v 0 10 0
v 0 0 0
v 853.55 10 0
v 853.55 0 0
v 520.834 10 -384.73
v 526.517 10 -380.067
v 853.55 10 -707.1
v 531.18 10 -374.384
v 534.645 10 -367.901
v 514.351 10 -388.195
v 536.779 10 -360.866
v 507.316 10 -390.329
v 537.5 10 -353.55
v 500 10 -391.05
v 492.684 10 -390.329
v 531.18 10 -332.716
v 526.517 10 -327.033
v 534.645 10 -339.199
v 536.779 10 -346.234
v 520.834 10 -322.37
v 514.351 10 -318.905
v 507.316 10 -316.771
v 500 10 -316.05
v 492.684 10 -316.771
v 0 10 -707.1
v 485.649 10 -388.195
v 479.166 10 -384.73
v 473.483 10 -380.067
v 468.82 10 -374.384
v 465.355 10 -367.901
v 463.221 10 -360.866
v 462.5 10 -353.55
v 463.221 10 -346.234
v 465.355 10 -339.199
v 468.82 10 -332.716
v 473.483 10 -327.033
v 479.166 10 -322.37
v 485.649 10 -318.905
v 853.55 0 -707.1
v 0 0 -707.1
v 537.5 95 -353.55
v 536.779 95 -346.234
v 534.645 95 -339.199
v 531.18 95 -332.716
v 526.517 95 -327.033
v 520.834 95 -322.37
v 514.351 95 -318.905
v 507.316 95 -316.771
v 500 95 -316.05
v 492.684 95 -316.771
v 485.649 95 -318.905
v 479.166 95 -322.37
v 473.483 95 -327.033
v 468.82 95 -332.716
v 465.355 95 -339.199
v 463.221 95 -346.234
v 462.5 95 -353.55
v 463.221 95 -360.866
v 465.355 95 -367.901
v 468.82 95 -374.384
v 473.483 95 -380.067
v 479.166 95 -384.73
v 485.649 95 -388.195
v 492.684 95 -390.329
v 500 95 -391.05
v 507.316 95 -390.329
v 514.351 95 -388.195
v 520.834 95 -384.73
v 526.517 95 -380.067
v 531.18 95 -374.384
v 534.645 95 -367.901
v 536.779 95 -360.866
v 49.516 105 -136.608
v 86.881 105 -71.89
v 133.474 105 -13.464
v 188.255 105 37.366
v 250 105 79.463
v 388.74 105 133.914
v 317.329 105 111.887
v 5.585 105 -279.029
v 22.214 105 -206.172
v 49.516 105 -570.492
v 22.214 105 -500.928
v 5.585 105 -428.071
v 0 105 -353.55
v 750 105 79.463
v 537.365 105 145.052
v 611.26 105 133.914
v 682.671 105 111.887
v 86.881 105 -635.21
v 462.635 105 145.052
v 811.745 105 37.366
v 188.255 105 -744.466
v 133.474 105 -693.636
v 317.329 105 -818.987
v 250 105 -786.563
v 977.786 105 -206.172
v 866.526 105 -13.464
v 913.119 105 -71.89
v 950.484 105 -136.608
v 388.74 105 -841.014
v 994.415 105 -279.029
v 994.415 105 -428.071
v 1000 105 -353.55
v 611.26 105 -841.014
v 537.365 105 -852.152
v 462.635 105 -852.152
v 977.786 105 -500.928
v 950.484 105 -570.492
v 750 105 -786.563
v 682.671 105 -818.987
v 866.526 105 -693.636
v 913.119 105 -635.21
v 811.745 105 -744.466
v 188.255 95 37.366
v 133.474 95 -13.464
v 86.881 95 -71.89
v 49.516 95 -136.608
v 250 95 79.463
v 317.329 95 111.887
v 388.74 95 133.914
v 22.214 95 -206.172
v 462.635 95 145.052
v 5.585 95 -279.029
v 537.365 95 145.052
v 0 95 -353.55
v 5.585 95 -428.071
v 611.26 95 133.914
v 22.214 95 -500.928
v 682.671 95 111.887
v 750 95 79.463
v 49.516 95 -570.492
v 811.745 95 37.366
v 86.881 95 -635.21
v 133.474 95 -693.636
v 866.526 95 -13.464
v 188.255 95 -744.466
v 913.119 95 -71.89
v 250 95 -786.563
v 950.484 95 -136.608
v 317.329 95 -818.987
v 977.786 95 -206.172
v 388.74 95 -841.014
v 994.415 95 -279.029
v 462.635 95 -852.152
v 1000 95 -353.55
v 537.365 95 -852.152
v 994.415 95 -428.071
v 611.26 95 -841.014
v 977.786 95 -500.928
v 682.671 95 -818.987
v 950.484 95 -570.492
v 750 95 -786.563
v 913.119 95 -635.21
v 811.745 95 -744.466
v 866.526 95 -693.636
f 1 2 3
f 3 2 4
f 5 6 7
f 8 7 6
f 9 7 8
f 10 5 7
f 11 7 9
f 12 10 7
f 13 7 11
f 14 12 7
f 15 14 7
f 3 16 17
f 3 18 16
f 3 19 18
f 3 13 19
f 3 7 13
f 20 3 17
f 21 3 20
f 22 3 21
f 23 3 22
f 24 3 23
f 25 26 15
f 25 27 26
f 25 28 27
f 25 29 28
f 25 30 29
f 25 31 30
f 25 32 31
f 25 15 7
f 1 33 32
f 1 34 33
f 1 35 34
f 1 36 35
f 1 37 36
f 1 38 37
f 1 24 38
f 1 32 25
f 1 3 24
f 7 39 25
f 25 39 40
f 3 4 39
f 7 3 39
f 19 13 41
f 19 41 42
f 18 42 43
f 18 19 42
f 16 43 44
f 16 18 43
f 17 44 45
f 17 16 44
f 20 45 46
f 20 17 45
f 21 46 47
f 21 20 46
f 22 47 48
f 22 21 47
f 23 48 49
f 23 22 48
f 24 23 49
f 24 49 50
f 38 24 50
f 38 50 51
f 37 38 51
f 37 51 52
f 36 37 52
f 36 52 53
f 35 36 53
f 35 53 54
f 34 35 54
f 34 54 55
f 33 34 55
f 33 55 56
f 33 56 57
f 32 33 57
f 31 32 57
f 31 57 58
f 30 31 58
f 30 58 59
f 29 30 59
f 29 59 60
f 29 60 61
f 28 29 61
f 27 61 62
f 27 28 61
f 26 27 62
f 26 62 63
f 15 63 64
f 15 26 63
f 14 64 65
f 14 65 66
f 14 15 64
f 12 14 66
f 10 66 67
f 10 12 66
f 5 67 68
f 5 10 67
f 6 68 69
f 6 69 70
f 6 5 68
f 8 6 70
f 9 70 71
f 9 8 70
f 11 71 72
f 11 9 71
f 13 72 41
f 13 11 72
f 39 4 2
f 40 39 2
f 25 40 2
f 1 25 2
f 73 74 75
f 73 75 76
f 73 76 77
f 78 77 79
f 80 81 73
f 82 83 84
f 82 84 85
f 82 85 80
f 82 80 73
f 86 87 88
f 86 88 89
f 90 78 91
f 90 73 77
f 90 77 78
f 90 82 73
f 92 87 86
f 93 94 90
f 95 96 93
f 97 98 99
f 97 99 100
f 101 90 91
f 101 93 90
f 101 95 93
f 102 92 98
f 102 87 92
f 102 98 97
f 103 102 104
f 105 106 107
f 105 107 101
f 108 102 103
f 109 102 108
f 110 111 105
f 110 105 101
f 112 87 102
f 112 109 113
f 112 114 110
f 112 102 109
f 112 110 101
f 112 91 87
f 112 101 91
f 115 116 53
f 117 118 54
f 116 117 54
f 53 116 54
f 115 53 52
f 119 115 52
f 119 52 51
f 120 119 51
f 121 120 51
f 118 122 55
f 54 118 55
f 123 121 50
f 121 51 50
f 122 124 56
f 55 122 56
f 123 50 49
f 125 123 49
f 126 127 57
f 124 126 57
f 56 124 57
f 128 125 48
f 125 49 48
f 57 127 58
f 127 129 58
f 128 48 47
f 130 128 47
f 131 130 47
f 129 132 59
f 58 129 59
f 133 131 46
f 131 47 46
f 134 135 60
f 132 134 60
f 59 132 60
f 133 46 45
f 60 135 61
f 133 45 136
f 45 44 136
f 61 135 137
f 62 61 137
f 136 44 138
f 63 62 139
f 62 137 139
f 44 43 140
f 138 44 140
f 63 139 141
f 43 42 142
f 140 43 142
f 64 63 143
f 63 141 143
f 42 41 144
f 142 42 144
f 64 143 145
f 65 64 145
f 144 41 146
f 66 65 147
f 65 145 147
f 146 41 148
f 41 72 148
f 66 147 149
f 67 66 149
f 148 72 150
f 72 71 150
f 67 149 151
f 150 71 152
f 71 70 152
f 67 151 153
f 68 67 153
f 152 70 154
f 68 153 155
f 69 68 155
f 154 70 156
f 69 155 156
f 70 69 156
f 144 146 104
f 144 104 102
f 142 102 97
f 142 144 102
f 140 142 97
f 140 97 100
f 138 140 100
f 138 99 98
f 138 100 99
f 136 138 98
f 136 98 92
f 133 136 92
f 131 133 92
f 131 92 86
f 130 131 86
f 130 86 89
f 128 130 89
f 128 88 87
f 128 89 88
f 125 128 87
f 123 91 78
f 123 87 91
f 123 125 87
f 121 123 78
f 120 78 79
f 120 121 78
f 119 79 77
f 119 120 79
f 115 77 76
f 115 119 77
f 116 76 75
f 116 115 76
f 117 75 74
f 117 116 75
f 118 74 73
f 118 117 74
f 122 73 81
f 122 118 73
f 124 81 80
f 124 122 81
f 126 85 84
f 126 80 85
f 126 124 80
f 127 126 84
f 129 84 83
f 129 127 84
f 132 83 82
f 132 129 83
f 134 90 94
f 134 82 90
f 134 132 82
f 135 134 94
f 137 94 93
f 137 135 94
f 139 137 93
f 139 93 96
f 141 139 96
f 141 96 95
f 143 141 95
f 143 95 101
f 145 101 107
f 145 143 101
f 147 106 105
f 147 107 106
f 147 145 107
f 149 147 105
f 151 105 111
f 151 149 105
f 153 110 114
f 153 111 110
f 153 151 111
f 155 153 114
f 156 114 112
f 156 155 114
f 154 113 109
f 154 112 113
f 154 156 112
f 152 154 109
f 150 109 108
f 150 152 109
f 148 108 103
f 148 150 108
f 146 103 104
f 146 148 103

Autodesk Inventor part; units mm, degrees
ref_plane "YZ Plane" through (0, 0, 0) normal (1, 0, 0) x (0, 1, 0)
ref_plane "XZ Plane" through (0, 0, 0) normal (0, 1, 0) x (-1, 0, 0)
ref_plane "XY Plane" through (0, 0, 0) normal (0, 0, 1) x (1, 0, 0)
sketch "Sketch1" plane through (0, 0, 0) normal (0, 1, 0) x (-1, 0, 0)
  line L0 (0, 0) -> (-853.55, 0)
  line L1 (-853.55, 0) -> (-853.55, -707.1)
  line L2 (-853.55, -707.1) -> (0, -707.1)
  line L3 (0, -707.1) -> (0, 0)
  dimension "d0" = 853.55
  dimension "d1" = 707.1
extrude "Extrusion1" add sketch "Sketch1" along normal blind 10
ref_plane "Work Plane4" through (500, 0, 0) normal (1, 0, 0) x (0, 0, -1)
ref_plane "Work Plane3" through (146.45, 0, 0) normal (1, 0, 0) x (0, 0, -1)
ref_plane "Work Plane2" through (853.55, 0, -353.55) normal (0, 0, -1) x (-1, 0, 0)
ref_plane "Work Plane5" through (500, 0, -353.55) normal (0.7071, 0, -0.7071) x (0, 1, 0)
ref_plane "Work Plane6" through (500, 0, -353.55) normal (0.7071, 0, 0.7071) x (0, -1, 0)
sketch "Sketch2" plane through (0, 10, 0) normal (0, 1, 0) x (1, 0, 0)
  line L0 (500, 848.52) -> (500, -141.42) projected
  line L1 (1009.615, 863.165) -> (-82.84, -229.29) projected
  line L2 (-170.71, 353.55) -> (1024.26, 353.55) projected
  line L3 (0, 0) -> (853.55, 0) projected
  line L4 (853.55, 0) -> (853.55, 707.1) projected
  line L5 (853.55, 707.1) -> (0, 707.1) projected
  line L6 (0, 707.1) -> (0, 0) projected
  circle A0 centre (500, 353.55) radius 37.5
  dimension "d5" = 75
extrude "Extrusion2" add sketch "Sketch2" along normal blind 85 contours A0 L1 L0 | L0 L2 A0 | L2 A0 L0 | L0 A0 L1 | L1 A0 L2 | L1 A0 L2
sketch "Sketch3" plane through (500, 95, -353.55) normal (0, 1, 0) x (1, 0, 0)
  circle A0 centre (0, 0) radius 500
  point P0 (-500, -353.55)
  dimension "d8" = 1000
extrude "Extrusion3" add sketch "Sketch3" along normal blind 10
properties part number "rotating_turntable"
